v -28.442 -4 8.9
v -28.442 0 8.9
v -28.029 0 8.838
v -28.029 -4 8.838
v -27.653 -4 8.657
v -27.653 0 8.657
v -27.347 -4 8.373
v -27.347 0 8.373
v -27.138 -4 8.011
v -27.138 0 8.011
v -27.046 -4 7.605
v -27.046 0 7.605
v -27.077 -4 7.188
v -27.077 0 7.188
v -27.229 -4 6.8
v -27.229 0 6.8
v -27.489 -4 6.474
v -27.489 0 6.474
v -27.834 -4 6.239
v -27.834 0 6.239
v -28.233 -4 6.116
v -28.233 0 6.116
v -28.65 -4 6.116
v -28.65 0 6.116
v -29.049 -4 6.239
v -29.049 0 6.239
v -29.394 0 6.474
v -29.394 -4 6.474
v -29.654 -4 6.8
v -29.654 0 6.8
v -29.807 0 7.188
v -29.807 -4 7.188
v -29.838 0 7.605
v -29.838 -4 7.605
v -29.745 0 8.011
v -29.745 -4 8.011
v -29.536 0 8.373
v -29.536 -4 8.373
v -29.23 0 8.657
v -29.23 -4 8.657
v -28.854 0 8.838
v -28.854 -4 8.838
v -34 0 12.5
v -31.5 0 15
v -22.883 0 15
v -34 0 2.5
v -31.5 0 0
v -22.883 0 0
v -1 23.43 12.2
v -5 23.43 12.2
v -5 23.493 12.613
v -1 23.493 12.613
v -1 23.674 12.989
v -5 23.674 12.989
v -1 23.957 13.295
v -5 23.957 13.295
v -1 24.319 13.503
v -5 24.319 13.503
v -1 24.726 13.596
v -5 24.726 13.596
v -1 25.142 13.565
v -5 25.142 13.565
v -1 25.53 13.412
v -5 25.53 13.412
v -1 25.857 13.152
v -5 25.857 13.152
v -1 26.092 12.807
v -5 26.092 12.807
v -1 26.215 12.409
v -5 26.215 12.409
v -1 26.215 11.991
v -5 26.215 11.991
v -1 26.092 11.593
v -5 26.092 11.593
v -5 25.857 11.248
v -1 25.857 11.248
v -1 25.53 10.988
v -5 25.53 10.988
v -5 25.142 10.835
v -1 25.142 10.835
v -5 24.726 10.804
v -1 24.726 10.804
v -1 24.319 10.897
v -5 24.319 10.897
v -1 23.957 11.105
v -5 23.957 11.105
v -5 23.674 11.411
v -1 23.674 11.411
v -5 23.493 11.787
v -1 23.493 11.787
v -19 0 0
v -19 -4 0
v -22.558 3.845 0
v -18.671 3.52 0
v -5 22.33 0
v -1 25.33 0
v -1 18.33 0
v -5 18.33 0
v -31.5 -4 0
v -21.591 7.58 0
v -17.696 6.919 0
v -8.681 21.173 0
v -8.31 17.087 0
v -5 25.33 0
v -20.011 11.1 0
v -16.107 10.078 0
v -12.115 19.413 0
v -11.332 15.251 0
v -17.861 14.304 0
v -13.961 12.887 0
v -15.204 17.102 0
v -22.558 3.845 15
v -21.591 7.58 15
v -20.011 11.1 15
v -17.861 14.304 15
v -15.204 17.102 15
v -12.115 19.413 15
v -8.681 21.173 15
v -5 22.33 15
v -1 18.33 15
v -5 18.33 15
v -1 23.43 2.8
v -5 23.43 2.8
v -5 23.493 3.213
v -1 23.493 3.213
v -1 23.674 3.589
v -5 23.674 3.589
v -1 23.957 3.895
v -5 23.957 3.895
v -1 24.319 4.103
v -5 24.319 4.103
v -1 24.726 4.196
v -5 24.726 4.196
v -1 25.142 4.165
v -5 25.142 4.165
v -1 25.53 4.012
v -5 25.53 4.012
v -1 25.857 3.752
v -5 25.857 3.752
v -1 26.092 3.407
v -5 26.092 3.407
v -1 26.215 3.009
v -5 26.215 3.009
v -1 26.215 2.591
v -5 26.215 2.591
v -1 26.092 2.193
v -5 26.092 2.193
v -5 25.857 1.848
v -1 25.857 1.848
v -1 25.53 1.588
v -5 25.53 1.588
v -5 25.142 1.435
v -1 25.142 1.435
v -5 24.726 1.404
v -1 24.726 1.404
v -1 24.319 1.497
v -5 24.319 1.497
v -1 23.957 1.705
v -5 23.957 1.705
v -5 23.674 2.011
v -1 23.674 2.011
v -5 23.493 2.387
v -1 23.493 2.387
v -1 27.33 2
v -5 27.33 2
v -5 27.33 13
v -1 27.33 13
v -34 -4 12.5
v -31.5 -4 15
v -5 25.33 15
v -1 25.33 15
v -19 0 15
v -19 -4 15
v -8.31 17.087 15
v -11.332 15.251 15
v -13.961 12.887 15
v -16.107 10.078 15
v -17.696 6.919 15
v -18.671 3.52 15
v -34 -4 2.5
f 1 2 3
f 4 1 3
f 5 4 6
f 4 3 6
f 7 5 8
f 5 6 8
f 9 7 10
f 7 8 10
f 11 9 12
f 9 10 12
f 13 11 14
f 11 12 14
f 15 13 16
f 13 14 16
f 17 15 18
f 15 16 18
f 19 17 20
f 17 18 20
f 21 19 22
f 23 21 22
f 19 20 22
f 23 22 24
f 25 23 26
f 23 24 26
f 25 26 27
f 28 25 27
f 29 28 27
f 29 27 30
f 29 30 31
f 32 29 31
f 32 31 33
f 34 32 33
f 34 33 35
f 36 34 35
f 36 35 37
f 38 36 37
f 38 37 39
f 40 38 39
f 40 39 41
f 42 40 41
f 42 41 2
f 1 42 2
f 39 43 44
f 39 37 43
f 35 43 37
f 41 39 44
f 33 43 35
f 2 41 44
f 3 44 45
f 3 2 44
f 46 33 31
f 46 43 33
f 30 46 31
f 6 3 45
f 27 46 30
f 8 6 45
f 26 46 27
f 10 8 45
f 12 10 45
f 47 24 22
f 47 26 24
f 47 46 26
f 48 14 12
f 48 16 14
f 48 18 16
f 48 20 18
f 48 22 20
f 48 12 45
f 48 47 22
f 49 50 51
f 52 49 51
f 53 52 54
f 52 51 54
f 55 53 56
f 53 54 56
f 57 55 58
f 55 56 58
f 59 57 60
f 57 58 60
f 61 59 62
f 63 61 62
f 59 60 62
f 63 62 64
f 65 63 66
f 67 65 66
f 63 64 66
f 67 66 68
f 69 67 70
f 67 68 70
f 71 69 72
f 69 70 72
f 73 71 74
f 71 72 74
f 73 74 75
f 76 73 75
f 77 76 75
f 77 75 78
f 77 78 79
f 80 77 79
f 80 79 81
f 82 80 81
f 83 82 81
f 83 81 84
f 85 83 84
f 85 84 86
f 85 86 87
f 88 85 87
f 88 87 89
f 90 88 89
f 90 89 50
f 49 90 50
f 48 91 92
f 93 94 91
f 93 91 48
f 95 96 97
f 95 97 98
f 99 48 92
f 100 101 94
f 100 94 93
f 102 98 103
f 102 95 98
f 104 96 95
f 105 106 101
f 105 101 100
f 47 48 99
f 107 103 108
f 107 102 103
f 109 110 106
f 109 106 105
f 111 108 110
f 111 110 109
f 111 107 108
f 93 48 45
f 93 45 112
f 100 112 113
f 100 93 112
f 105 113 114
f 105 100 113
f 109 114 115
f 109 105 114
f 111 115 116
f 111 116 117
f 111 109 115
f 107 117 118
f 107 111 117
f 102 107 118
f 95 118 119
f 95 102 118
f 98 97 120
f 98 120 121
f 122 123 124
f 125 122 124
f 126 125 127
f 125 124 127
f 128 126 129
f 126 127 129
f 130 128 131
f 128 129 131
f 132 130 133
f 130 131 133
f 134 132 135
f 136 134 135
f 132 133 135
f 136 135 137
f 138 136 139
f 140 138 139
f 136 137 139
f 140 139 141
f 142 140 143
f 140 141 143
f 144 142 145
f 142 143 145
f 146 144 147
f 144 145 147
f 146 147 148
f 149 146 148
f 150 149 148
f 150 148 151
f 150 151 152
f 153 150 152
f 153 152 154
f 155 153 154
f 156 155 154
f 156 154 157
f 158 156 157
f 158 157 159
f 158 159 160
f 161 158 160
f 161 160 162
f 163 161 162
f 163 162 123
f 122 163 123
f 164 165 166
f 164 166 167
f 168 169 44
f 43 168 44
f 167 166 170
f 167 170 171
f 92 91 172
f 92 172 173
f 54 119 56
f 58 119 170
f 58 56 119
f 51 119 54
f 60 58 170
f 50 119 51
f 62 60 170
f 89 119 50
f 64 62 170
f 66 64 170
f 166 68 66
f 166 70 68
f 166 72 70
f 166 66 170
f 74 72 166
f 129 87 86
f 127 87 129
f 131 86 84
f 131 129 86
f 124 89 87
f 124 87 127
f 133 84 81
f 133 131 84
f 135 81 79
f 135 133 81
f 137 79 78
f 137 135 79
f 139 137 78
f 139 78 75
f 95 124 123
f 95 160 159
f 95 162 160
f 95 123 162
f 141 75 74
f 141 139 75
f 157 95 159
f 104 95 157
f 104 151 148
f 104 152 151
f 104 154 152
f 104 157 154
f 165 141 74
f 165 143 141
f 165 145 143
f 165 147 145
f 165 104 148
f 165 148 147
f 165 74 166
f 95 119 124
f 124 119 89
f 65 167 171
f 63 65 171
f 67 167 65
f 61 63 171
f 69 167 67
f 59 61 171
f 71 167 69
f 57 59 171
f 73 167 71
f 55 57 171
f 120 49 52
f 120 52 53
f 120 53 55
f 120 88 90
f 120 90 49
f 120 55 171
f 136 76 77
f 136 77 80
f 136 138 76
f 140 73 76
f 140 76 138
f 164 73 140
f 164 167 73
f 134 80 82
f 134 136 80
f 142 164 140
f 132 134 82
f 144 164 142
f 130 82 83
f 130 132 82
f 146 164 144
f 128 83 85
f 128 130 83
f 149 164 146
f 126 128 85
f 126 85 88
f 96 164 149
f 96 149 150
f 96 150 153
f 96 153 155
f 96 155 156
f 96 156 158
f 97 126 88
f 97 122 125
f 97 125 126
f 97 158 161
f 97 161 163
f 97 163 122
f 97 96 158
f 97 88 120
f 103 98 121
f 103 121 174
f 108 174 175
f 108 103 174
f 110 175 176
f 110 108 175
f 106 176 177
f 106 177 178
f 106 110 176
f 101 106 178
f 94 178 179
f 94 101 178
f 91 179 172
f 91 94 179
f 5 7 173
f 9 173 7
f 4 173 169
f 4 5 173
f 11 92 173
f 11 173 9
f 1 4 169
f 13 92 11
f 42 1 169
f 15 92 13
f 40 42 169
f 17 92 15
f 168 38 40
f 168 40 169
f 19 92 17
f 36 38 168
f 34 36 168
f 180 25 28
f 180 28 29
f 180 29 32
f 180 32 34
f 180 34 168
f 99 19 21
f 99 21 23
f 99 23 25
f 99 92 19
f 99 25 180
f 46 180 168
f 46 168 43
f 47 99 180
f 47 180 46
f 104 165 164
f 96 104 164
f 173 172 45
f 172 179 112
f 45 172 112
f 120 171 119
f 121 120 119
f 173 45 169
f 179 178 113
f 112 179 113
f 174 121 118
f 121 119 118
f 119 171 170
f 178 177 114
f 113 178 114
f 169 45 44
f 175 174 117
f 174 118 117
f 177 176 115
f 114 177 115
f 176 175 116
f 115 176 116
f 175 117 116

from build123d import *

# Parameters (mm, degrees)
BOSS_EXTRUDE1_DEPTH = 15
CHAMFER1_SIZE       = 2.5
SKETCH2_R           = 1.4
CUT_EXTRUDE1_DEPTH  = 15
CHAMFER2_SIZE       = 2
SKETCH3_R           = 1.4
CUT_EXTRUDE2_DEPTH  = 47.129659115


with BuildPart() as part:
    # Sketch1 → Boss-Extrude1 (new body)
    with BuildSketch(Plane.XY):
        with BuildLine():
            Line((-19, 0), (-19, -4))
            Line((-19, -4), (-34, -4))
            Line((-34, -4), (-34, 0))
            Line((-34, 0), (-22.883234523, 0))
            ThreePointArc((-22.883234523, 0), (-17.861391251, 14.304304416), (-5, 22.33030278))
            Line((-5, 22.33030278), (-5, 27.33030278))
            Line((-5, 27.33030278), (-1, 27.33030278))
            Line((-1, 27.33030278), (-1, 18.33030278))
            Line((-1, 18.33030278), (-5, 18.33030278))
            ThreePointArc((-5, 18.33030278), (-15.099668871, 11.532562595), (-19, 0))
        make_face()
    extrude(amount=BOSS_EXTRUDE1_DEPTH)

    # Chamfer1
    chamfer1_edges = [part.edges().sort_by_distance(p)[0] for p in [
        (-34, -2, 0),
        (-34, -2, 15),
    ]]
    chamfer(chamfer1_edges, length=CHAMFER1_SIZE)

    # Sketch2 → Cut-Extrude1 (cut)
    with BuildSketch(Plane.ZY.offset(5)):
        with Locations(Location((2.8, 24.83030278, 0), (0, 0, 270))):
            Circle(SKETCH2_R)
        with Locations(Location((12.2, 24.83030278, 0), (0, 0, 270))):
            Circle(SKETCH2_R)
    extrude(amount=-CUT_EXTRUDE1_DEPTH, mode=Mode.SUBTRACT)

    # Chamfer2
    chamfer2_edges = [part.edges().sort_by_distance(p)[0] for p in [
        (-3, 27.33030278, 0),
        (-3, 27.33030278, 15),
    ]]
    chamfer(chamfer2_edges, length=CHAMFER2_SIZE)

    # Sketch3 → Cut-Extrude2 (cut, through all)
    with BuildSketch(Plane(origin=(0, 0, 0), x_dir=(1, 0, 0), z_dir=(0, 1, 0))):
        with Locations(Location((-28.441617262, -7.5, 0), (0, 0, 270))):
            Circle(SKETCH3_R)
    extrude(amount=-CUT_EXTRUDE2_DEPTH, mode=Mode.SUBTRACT)


solid = part.part
